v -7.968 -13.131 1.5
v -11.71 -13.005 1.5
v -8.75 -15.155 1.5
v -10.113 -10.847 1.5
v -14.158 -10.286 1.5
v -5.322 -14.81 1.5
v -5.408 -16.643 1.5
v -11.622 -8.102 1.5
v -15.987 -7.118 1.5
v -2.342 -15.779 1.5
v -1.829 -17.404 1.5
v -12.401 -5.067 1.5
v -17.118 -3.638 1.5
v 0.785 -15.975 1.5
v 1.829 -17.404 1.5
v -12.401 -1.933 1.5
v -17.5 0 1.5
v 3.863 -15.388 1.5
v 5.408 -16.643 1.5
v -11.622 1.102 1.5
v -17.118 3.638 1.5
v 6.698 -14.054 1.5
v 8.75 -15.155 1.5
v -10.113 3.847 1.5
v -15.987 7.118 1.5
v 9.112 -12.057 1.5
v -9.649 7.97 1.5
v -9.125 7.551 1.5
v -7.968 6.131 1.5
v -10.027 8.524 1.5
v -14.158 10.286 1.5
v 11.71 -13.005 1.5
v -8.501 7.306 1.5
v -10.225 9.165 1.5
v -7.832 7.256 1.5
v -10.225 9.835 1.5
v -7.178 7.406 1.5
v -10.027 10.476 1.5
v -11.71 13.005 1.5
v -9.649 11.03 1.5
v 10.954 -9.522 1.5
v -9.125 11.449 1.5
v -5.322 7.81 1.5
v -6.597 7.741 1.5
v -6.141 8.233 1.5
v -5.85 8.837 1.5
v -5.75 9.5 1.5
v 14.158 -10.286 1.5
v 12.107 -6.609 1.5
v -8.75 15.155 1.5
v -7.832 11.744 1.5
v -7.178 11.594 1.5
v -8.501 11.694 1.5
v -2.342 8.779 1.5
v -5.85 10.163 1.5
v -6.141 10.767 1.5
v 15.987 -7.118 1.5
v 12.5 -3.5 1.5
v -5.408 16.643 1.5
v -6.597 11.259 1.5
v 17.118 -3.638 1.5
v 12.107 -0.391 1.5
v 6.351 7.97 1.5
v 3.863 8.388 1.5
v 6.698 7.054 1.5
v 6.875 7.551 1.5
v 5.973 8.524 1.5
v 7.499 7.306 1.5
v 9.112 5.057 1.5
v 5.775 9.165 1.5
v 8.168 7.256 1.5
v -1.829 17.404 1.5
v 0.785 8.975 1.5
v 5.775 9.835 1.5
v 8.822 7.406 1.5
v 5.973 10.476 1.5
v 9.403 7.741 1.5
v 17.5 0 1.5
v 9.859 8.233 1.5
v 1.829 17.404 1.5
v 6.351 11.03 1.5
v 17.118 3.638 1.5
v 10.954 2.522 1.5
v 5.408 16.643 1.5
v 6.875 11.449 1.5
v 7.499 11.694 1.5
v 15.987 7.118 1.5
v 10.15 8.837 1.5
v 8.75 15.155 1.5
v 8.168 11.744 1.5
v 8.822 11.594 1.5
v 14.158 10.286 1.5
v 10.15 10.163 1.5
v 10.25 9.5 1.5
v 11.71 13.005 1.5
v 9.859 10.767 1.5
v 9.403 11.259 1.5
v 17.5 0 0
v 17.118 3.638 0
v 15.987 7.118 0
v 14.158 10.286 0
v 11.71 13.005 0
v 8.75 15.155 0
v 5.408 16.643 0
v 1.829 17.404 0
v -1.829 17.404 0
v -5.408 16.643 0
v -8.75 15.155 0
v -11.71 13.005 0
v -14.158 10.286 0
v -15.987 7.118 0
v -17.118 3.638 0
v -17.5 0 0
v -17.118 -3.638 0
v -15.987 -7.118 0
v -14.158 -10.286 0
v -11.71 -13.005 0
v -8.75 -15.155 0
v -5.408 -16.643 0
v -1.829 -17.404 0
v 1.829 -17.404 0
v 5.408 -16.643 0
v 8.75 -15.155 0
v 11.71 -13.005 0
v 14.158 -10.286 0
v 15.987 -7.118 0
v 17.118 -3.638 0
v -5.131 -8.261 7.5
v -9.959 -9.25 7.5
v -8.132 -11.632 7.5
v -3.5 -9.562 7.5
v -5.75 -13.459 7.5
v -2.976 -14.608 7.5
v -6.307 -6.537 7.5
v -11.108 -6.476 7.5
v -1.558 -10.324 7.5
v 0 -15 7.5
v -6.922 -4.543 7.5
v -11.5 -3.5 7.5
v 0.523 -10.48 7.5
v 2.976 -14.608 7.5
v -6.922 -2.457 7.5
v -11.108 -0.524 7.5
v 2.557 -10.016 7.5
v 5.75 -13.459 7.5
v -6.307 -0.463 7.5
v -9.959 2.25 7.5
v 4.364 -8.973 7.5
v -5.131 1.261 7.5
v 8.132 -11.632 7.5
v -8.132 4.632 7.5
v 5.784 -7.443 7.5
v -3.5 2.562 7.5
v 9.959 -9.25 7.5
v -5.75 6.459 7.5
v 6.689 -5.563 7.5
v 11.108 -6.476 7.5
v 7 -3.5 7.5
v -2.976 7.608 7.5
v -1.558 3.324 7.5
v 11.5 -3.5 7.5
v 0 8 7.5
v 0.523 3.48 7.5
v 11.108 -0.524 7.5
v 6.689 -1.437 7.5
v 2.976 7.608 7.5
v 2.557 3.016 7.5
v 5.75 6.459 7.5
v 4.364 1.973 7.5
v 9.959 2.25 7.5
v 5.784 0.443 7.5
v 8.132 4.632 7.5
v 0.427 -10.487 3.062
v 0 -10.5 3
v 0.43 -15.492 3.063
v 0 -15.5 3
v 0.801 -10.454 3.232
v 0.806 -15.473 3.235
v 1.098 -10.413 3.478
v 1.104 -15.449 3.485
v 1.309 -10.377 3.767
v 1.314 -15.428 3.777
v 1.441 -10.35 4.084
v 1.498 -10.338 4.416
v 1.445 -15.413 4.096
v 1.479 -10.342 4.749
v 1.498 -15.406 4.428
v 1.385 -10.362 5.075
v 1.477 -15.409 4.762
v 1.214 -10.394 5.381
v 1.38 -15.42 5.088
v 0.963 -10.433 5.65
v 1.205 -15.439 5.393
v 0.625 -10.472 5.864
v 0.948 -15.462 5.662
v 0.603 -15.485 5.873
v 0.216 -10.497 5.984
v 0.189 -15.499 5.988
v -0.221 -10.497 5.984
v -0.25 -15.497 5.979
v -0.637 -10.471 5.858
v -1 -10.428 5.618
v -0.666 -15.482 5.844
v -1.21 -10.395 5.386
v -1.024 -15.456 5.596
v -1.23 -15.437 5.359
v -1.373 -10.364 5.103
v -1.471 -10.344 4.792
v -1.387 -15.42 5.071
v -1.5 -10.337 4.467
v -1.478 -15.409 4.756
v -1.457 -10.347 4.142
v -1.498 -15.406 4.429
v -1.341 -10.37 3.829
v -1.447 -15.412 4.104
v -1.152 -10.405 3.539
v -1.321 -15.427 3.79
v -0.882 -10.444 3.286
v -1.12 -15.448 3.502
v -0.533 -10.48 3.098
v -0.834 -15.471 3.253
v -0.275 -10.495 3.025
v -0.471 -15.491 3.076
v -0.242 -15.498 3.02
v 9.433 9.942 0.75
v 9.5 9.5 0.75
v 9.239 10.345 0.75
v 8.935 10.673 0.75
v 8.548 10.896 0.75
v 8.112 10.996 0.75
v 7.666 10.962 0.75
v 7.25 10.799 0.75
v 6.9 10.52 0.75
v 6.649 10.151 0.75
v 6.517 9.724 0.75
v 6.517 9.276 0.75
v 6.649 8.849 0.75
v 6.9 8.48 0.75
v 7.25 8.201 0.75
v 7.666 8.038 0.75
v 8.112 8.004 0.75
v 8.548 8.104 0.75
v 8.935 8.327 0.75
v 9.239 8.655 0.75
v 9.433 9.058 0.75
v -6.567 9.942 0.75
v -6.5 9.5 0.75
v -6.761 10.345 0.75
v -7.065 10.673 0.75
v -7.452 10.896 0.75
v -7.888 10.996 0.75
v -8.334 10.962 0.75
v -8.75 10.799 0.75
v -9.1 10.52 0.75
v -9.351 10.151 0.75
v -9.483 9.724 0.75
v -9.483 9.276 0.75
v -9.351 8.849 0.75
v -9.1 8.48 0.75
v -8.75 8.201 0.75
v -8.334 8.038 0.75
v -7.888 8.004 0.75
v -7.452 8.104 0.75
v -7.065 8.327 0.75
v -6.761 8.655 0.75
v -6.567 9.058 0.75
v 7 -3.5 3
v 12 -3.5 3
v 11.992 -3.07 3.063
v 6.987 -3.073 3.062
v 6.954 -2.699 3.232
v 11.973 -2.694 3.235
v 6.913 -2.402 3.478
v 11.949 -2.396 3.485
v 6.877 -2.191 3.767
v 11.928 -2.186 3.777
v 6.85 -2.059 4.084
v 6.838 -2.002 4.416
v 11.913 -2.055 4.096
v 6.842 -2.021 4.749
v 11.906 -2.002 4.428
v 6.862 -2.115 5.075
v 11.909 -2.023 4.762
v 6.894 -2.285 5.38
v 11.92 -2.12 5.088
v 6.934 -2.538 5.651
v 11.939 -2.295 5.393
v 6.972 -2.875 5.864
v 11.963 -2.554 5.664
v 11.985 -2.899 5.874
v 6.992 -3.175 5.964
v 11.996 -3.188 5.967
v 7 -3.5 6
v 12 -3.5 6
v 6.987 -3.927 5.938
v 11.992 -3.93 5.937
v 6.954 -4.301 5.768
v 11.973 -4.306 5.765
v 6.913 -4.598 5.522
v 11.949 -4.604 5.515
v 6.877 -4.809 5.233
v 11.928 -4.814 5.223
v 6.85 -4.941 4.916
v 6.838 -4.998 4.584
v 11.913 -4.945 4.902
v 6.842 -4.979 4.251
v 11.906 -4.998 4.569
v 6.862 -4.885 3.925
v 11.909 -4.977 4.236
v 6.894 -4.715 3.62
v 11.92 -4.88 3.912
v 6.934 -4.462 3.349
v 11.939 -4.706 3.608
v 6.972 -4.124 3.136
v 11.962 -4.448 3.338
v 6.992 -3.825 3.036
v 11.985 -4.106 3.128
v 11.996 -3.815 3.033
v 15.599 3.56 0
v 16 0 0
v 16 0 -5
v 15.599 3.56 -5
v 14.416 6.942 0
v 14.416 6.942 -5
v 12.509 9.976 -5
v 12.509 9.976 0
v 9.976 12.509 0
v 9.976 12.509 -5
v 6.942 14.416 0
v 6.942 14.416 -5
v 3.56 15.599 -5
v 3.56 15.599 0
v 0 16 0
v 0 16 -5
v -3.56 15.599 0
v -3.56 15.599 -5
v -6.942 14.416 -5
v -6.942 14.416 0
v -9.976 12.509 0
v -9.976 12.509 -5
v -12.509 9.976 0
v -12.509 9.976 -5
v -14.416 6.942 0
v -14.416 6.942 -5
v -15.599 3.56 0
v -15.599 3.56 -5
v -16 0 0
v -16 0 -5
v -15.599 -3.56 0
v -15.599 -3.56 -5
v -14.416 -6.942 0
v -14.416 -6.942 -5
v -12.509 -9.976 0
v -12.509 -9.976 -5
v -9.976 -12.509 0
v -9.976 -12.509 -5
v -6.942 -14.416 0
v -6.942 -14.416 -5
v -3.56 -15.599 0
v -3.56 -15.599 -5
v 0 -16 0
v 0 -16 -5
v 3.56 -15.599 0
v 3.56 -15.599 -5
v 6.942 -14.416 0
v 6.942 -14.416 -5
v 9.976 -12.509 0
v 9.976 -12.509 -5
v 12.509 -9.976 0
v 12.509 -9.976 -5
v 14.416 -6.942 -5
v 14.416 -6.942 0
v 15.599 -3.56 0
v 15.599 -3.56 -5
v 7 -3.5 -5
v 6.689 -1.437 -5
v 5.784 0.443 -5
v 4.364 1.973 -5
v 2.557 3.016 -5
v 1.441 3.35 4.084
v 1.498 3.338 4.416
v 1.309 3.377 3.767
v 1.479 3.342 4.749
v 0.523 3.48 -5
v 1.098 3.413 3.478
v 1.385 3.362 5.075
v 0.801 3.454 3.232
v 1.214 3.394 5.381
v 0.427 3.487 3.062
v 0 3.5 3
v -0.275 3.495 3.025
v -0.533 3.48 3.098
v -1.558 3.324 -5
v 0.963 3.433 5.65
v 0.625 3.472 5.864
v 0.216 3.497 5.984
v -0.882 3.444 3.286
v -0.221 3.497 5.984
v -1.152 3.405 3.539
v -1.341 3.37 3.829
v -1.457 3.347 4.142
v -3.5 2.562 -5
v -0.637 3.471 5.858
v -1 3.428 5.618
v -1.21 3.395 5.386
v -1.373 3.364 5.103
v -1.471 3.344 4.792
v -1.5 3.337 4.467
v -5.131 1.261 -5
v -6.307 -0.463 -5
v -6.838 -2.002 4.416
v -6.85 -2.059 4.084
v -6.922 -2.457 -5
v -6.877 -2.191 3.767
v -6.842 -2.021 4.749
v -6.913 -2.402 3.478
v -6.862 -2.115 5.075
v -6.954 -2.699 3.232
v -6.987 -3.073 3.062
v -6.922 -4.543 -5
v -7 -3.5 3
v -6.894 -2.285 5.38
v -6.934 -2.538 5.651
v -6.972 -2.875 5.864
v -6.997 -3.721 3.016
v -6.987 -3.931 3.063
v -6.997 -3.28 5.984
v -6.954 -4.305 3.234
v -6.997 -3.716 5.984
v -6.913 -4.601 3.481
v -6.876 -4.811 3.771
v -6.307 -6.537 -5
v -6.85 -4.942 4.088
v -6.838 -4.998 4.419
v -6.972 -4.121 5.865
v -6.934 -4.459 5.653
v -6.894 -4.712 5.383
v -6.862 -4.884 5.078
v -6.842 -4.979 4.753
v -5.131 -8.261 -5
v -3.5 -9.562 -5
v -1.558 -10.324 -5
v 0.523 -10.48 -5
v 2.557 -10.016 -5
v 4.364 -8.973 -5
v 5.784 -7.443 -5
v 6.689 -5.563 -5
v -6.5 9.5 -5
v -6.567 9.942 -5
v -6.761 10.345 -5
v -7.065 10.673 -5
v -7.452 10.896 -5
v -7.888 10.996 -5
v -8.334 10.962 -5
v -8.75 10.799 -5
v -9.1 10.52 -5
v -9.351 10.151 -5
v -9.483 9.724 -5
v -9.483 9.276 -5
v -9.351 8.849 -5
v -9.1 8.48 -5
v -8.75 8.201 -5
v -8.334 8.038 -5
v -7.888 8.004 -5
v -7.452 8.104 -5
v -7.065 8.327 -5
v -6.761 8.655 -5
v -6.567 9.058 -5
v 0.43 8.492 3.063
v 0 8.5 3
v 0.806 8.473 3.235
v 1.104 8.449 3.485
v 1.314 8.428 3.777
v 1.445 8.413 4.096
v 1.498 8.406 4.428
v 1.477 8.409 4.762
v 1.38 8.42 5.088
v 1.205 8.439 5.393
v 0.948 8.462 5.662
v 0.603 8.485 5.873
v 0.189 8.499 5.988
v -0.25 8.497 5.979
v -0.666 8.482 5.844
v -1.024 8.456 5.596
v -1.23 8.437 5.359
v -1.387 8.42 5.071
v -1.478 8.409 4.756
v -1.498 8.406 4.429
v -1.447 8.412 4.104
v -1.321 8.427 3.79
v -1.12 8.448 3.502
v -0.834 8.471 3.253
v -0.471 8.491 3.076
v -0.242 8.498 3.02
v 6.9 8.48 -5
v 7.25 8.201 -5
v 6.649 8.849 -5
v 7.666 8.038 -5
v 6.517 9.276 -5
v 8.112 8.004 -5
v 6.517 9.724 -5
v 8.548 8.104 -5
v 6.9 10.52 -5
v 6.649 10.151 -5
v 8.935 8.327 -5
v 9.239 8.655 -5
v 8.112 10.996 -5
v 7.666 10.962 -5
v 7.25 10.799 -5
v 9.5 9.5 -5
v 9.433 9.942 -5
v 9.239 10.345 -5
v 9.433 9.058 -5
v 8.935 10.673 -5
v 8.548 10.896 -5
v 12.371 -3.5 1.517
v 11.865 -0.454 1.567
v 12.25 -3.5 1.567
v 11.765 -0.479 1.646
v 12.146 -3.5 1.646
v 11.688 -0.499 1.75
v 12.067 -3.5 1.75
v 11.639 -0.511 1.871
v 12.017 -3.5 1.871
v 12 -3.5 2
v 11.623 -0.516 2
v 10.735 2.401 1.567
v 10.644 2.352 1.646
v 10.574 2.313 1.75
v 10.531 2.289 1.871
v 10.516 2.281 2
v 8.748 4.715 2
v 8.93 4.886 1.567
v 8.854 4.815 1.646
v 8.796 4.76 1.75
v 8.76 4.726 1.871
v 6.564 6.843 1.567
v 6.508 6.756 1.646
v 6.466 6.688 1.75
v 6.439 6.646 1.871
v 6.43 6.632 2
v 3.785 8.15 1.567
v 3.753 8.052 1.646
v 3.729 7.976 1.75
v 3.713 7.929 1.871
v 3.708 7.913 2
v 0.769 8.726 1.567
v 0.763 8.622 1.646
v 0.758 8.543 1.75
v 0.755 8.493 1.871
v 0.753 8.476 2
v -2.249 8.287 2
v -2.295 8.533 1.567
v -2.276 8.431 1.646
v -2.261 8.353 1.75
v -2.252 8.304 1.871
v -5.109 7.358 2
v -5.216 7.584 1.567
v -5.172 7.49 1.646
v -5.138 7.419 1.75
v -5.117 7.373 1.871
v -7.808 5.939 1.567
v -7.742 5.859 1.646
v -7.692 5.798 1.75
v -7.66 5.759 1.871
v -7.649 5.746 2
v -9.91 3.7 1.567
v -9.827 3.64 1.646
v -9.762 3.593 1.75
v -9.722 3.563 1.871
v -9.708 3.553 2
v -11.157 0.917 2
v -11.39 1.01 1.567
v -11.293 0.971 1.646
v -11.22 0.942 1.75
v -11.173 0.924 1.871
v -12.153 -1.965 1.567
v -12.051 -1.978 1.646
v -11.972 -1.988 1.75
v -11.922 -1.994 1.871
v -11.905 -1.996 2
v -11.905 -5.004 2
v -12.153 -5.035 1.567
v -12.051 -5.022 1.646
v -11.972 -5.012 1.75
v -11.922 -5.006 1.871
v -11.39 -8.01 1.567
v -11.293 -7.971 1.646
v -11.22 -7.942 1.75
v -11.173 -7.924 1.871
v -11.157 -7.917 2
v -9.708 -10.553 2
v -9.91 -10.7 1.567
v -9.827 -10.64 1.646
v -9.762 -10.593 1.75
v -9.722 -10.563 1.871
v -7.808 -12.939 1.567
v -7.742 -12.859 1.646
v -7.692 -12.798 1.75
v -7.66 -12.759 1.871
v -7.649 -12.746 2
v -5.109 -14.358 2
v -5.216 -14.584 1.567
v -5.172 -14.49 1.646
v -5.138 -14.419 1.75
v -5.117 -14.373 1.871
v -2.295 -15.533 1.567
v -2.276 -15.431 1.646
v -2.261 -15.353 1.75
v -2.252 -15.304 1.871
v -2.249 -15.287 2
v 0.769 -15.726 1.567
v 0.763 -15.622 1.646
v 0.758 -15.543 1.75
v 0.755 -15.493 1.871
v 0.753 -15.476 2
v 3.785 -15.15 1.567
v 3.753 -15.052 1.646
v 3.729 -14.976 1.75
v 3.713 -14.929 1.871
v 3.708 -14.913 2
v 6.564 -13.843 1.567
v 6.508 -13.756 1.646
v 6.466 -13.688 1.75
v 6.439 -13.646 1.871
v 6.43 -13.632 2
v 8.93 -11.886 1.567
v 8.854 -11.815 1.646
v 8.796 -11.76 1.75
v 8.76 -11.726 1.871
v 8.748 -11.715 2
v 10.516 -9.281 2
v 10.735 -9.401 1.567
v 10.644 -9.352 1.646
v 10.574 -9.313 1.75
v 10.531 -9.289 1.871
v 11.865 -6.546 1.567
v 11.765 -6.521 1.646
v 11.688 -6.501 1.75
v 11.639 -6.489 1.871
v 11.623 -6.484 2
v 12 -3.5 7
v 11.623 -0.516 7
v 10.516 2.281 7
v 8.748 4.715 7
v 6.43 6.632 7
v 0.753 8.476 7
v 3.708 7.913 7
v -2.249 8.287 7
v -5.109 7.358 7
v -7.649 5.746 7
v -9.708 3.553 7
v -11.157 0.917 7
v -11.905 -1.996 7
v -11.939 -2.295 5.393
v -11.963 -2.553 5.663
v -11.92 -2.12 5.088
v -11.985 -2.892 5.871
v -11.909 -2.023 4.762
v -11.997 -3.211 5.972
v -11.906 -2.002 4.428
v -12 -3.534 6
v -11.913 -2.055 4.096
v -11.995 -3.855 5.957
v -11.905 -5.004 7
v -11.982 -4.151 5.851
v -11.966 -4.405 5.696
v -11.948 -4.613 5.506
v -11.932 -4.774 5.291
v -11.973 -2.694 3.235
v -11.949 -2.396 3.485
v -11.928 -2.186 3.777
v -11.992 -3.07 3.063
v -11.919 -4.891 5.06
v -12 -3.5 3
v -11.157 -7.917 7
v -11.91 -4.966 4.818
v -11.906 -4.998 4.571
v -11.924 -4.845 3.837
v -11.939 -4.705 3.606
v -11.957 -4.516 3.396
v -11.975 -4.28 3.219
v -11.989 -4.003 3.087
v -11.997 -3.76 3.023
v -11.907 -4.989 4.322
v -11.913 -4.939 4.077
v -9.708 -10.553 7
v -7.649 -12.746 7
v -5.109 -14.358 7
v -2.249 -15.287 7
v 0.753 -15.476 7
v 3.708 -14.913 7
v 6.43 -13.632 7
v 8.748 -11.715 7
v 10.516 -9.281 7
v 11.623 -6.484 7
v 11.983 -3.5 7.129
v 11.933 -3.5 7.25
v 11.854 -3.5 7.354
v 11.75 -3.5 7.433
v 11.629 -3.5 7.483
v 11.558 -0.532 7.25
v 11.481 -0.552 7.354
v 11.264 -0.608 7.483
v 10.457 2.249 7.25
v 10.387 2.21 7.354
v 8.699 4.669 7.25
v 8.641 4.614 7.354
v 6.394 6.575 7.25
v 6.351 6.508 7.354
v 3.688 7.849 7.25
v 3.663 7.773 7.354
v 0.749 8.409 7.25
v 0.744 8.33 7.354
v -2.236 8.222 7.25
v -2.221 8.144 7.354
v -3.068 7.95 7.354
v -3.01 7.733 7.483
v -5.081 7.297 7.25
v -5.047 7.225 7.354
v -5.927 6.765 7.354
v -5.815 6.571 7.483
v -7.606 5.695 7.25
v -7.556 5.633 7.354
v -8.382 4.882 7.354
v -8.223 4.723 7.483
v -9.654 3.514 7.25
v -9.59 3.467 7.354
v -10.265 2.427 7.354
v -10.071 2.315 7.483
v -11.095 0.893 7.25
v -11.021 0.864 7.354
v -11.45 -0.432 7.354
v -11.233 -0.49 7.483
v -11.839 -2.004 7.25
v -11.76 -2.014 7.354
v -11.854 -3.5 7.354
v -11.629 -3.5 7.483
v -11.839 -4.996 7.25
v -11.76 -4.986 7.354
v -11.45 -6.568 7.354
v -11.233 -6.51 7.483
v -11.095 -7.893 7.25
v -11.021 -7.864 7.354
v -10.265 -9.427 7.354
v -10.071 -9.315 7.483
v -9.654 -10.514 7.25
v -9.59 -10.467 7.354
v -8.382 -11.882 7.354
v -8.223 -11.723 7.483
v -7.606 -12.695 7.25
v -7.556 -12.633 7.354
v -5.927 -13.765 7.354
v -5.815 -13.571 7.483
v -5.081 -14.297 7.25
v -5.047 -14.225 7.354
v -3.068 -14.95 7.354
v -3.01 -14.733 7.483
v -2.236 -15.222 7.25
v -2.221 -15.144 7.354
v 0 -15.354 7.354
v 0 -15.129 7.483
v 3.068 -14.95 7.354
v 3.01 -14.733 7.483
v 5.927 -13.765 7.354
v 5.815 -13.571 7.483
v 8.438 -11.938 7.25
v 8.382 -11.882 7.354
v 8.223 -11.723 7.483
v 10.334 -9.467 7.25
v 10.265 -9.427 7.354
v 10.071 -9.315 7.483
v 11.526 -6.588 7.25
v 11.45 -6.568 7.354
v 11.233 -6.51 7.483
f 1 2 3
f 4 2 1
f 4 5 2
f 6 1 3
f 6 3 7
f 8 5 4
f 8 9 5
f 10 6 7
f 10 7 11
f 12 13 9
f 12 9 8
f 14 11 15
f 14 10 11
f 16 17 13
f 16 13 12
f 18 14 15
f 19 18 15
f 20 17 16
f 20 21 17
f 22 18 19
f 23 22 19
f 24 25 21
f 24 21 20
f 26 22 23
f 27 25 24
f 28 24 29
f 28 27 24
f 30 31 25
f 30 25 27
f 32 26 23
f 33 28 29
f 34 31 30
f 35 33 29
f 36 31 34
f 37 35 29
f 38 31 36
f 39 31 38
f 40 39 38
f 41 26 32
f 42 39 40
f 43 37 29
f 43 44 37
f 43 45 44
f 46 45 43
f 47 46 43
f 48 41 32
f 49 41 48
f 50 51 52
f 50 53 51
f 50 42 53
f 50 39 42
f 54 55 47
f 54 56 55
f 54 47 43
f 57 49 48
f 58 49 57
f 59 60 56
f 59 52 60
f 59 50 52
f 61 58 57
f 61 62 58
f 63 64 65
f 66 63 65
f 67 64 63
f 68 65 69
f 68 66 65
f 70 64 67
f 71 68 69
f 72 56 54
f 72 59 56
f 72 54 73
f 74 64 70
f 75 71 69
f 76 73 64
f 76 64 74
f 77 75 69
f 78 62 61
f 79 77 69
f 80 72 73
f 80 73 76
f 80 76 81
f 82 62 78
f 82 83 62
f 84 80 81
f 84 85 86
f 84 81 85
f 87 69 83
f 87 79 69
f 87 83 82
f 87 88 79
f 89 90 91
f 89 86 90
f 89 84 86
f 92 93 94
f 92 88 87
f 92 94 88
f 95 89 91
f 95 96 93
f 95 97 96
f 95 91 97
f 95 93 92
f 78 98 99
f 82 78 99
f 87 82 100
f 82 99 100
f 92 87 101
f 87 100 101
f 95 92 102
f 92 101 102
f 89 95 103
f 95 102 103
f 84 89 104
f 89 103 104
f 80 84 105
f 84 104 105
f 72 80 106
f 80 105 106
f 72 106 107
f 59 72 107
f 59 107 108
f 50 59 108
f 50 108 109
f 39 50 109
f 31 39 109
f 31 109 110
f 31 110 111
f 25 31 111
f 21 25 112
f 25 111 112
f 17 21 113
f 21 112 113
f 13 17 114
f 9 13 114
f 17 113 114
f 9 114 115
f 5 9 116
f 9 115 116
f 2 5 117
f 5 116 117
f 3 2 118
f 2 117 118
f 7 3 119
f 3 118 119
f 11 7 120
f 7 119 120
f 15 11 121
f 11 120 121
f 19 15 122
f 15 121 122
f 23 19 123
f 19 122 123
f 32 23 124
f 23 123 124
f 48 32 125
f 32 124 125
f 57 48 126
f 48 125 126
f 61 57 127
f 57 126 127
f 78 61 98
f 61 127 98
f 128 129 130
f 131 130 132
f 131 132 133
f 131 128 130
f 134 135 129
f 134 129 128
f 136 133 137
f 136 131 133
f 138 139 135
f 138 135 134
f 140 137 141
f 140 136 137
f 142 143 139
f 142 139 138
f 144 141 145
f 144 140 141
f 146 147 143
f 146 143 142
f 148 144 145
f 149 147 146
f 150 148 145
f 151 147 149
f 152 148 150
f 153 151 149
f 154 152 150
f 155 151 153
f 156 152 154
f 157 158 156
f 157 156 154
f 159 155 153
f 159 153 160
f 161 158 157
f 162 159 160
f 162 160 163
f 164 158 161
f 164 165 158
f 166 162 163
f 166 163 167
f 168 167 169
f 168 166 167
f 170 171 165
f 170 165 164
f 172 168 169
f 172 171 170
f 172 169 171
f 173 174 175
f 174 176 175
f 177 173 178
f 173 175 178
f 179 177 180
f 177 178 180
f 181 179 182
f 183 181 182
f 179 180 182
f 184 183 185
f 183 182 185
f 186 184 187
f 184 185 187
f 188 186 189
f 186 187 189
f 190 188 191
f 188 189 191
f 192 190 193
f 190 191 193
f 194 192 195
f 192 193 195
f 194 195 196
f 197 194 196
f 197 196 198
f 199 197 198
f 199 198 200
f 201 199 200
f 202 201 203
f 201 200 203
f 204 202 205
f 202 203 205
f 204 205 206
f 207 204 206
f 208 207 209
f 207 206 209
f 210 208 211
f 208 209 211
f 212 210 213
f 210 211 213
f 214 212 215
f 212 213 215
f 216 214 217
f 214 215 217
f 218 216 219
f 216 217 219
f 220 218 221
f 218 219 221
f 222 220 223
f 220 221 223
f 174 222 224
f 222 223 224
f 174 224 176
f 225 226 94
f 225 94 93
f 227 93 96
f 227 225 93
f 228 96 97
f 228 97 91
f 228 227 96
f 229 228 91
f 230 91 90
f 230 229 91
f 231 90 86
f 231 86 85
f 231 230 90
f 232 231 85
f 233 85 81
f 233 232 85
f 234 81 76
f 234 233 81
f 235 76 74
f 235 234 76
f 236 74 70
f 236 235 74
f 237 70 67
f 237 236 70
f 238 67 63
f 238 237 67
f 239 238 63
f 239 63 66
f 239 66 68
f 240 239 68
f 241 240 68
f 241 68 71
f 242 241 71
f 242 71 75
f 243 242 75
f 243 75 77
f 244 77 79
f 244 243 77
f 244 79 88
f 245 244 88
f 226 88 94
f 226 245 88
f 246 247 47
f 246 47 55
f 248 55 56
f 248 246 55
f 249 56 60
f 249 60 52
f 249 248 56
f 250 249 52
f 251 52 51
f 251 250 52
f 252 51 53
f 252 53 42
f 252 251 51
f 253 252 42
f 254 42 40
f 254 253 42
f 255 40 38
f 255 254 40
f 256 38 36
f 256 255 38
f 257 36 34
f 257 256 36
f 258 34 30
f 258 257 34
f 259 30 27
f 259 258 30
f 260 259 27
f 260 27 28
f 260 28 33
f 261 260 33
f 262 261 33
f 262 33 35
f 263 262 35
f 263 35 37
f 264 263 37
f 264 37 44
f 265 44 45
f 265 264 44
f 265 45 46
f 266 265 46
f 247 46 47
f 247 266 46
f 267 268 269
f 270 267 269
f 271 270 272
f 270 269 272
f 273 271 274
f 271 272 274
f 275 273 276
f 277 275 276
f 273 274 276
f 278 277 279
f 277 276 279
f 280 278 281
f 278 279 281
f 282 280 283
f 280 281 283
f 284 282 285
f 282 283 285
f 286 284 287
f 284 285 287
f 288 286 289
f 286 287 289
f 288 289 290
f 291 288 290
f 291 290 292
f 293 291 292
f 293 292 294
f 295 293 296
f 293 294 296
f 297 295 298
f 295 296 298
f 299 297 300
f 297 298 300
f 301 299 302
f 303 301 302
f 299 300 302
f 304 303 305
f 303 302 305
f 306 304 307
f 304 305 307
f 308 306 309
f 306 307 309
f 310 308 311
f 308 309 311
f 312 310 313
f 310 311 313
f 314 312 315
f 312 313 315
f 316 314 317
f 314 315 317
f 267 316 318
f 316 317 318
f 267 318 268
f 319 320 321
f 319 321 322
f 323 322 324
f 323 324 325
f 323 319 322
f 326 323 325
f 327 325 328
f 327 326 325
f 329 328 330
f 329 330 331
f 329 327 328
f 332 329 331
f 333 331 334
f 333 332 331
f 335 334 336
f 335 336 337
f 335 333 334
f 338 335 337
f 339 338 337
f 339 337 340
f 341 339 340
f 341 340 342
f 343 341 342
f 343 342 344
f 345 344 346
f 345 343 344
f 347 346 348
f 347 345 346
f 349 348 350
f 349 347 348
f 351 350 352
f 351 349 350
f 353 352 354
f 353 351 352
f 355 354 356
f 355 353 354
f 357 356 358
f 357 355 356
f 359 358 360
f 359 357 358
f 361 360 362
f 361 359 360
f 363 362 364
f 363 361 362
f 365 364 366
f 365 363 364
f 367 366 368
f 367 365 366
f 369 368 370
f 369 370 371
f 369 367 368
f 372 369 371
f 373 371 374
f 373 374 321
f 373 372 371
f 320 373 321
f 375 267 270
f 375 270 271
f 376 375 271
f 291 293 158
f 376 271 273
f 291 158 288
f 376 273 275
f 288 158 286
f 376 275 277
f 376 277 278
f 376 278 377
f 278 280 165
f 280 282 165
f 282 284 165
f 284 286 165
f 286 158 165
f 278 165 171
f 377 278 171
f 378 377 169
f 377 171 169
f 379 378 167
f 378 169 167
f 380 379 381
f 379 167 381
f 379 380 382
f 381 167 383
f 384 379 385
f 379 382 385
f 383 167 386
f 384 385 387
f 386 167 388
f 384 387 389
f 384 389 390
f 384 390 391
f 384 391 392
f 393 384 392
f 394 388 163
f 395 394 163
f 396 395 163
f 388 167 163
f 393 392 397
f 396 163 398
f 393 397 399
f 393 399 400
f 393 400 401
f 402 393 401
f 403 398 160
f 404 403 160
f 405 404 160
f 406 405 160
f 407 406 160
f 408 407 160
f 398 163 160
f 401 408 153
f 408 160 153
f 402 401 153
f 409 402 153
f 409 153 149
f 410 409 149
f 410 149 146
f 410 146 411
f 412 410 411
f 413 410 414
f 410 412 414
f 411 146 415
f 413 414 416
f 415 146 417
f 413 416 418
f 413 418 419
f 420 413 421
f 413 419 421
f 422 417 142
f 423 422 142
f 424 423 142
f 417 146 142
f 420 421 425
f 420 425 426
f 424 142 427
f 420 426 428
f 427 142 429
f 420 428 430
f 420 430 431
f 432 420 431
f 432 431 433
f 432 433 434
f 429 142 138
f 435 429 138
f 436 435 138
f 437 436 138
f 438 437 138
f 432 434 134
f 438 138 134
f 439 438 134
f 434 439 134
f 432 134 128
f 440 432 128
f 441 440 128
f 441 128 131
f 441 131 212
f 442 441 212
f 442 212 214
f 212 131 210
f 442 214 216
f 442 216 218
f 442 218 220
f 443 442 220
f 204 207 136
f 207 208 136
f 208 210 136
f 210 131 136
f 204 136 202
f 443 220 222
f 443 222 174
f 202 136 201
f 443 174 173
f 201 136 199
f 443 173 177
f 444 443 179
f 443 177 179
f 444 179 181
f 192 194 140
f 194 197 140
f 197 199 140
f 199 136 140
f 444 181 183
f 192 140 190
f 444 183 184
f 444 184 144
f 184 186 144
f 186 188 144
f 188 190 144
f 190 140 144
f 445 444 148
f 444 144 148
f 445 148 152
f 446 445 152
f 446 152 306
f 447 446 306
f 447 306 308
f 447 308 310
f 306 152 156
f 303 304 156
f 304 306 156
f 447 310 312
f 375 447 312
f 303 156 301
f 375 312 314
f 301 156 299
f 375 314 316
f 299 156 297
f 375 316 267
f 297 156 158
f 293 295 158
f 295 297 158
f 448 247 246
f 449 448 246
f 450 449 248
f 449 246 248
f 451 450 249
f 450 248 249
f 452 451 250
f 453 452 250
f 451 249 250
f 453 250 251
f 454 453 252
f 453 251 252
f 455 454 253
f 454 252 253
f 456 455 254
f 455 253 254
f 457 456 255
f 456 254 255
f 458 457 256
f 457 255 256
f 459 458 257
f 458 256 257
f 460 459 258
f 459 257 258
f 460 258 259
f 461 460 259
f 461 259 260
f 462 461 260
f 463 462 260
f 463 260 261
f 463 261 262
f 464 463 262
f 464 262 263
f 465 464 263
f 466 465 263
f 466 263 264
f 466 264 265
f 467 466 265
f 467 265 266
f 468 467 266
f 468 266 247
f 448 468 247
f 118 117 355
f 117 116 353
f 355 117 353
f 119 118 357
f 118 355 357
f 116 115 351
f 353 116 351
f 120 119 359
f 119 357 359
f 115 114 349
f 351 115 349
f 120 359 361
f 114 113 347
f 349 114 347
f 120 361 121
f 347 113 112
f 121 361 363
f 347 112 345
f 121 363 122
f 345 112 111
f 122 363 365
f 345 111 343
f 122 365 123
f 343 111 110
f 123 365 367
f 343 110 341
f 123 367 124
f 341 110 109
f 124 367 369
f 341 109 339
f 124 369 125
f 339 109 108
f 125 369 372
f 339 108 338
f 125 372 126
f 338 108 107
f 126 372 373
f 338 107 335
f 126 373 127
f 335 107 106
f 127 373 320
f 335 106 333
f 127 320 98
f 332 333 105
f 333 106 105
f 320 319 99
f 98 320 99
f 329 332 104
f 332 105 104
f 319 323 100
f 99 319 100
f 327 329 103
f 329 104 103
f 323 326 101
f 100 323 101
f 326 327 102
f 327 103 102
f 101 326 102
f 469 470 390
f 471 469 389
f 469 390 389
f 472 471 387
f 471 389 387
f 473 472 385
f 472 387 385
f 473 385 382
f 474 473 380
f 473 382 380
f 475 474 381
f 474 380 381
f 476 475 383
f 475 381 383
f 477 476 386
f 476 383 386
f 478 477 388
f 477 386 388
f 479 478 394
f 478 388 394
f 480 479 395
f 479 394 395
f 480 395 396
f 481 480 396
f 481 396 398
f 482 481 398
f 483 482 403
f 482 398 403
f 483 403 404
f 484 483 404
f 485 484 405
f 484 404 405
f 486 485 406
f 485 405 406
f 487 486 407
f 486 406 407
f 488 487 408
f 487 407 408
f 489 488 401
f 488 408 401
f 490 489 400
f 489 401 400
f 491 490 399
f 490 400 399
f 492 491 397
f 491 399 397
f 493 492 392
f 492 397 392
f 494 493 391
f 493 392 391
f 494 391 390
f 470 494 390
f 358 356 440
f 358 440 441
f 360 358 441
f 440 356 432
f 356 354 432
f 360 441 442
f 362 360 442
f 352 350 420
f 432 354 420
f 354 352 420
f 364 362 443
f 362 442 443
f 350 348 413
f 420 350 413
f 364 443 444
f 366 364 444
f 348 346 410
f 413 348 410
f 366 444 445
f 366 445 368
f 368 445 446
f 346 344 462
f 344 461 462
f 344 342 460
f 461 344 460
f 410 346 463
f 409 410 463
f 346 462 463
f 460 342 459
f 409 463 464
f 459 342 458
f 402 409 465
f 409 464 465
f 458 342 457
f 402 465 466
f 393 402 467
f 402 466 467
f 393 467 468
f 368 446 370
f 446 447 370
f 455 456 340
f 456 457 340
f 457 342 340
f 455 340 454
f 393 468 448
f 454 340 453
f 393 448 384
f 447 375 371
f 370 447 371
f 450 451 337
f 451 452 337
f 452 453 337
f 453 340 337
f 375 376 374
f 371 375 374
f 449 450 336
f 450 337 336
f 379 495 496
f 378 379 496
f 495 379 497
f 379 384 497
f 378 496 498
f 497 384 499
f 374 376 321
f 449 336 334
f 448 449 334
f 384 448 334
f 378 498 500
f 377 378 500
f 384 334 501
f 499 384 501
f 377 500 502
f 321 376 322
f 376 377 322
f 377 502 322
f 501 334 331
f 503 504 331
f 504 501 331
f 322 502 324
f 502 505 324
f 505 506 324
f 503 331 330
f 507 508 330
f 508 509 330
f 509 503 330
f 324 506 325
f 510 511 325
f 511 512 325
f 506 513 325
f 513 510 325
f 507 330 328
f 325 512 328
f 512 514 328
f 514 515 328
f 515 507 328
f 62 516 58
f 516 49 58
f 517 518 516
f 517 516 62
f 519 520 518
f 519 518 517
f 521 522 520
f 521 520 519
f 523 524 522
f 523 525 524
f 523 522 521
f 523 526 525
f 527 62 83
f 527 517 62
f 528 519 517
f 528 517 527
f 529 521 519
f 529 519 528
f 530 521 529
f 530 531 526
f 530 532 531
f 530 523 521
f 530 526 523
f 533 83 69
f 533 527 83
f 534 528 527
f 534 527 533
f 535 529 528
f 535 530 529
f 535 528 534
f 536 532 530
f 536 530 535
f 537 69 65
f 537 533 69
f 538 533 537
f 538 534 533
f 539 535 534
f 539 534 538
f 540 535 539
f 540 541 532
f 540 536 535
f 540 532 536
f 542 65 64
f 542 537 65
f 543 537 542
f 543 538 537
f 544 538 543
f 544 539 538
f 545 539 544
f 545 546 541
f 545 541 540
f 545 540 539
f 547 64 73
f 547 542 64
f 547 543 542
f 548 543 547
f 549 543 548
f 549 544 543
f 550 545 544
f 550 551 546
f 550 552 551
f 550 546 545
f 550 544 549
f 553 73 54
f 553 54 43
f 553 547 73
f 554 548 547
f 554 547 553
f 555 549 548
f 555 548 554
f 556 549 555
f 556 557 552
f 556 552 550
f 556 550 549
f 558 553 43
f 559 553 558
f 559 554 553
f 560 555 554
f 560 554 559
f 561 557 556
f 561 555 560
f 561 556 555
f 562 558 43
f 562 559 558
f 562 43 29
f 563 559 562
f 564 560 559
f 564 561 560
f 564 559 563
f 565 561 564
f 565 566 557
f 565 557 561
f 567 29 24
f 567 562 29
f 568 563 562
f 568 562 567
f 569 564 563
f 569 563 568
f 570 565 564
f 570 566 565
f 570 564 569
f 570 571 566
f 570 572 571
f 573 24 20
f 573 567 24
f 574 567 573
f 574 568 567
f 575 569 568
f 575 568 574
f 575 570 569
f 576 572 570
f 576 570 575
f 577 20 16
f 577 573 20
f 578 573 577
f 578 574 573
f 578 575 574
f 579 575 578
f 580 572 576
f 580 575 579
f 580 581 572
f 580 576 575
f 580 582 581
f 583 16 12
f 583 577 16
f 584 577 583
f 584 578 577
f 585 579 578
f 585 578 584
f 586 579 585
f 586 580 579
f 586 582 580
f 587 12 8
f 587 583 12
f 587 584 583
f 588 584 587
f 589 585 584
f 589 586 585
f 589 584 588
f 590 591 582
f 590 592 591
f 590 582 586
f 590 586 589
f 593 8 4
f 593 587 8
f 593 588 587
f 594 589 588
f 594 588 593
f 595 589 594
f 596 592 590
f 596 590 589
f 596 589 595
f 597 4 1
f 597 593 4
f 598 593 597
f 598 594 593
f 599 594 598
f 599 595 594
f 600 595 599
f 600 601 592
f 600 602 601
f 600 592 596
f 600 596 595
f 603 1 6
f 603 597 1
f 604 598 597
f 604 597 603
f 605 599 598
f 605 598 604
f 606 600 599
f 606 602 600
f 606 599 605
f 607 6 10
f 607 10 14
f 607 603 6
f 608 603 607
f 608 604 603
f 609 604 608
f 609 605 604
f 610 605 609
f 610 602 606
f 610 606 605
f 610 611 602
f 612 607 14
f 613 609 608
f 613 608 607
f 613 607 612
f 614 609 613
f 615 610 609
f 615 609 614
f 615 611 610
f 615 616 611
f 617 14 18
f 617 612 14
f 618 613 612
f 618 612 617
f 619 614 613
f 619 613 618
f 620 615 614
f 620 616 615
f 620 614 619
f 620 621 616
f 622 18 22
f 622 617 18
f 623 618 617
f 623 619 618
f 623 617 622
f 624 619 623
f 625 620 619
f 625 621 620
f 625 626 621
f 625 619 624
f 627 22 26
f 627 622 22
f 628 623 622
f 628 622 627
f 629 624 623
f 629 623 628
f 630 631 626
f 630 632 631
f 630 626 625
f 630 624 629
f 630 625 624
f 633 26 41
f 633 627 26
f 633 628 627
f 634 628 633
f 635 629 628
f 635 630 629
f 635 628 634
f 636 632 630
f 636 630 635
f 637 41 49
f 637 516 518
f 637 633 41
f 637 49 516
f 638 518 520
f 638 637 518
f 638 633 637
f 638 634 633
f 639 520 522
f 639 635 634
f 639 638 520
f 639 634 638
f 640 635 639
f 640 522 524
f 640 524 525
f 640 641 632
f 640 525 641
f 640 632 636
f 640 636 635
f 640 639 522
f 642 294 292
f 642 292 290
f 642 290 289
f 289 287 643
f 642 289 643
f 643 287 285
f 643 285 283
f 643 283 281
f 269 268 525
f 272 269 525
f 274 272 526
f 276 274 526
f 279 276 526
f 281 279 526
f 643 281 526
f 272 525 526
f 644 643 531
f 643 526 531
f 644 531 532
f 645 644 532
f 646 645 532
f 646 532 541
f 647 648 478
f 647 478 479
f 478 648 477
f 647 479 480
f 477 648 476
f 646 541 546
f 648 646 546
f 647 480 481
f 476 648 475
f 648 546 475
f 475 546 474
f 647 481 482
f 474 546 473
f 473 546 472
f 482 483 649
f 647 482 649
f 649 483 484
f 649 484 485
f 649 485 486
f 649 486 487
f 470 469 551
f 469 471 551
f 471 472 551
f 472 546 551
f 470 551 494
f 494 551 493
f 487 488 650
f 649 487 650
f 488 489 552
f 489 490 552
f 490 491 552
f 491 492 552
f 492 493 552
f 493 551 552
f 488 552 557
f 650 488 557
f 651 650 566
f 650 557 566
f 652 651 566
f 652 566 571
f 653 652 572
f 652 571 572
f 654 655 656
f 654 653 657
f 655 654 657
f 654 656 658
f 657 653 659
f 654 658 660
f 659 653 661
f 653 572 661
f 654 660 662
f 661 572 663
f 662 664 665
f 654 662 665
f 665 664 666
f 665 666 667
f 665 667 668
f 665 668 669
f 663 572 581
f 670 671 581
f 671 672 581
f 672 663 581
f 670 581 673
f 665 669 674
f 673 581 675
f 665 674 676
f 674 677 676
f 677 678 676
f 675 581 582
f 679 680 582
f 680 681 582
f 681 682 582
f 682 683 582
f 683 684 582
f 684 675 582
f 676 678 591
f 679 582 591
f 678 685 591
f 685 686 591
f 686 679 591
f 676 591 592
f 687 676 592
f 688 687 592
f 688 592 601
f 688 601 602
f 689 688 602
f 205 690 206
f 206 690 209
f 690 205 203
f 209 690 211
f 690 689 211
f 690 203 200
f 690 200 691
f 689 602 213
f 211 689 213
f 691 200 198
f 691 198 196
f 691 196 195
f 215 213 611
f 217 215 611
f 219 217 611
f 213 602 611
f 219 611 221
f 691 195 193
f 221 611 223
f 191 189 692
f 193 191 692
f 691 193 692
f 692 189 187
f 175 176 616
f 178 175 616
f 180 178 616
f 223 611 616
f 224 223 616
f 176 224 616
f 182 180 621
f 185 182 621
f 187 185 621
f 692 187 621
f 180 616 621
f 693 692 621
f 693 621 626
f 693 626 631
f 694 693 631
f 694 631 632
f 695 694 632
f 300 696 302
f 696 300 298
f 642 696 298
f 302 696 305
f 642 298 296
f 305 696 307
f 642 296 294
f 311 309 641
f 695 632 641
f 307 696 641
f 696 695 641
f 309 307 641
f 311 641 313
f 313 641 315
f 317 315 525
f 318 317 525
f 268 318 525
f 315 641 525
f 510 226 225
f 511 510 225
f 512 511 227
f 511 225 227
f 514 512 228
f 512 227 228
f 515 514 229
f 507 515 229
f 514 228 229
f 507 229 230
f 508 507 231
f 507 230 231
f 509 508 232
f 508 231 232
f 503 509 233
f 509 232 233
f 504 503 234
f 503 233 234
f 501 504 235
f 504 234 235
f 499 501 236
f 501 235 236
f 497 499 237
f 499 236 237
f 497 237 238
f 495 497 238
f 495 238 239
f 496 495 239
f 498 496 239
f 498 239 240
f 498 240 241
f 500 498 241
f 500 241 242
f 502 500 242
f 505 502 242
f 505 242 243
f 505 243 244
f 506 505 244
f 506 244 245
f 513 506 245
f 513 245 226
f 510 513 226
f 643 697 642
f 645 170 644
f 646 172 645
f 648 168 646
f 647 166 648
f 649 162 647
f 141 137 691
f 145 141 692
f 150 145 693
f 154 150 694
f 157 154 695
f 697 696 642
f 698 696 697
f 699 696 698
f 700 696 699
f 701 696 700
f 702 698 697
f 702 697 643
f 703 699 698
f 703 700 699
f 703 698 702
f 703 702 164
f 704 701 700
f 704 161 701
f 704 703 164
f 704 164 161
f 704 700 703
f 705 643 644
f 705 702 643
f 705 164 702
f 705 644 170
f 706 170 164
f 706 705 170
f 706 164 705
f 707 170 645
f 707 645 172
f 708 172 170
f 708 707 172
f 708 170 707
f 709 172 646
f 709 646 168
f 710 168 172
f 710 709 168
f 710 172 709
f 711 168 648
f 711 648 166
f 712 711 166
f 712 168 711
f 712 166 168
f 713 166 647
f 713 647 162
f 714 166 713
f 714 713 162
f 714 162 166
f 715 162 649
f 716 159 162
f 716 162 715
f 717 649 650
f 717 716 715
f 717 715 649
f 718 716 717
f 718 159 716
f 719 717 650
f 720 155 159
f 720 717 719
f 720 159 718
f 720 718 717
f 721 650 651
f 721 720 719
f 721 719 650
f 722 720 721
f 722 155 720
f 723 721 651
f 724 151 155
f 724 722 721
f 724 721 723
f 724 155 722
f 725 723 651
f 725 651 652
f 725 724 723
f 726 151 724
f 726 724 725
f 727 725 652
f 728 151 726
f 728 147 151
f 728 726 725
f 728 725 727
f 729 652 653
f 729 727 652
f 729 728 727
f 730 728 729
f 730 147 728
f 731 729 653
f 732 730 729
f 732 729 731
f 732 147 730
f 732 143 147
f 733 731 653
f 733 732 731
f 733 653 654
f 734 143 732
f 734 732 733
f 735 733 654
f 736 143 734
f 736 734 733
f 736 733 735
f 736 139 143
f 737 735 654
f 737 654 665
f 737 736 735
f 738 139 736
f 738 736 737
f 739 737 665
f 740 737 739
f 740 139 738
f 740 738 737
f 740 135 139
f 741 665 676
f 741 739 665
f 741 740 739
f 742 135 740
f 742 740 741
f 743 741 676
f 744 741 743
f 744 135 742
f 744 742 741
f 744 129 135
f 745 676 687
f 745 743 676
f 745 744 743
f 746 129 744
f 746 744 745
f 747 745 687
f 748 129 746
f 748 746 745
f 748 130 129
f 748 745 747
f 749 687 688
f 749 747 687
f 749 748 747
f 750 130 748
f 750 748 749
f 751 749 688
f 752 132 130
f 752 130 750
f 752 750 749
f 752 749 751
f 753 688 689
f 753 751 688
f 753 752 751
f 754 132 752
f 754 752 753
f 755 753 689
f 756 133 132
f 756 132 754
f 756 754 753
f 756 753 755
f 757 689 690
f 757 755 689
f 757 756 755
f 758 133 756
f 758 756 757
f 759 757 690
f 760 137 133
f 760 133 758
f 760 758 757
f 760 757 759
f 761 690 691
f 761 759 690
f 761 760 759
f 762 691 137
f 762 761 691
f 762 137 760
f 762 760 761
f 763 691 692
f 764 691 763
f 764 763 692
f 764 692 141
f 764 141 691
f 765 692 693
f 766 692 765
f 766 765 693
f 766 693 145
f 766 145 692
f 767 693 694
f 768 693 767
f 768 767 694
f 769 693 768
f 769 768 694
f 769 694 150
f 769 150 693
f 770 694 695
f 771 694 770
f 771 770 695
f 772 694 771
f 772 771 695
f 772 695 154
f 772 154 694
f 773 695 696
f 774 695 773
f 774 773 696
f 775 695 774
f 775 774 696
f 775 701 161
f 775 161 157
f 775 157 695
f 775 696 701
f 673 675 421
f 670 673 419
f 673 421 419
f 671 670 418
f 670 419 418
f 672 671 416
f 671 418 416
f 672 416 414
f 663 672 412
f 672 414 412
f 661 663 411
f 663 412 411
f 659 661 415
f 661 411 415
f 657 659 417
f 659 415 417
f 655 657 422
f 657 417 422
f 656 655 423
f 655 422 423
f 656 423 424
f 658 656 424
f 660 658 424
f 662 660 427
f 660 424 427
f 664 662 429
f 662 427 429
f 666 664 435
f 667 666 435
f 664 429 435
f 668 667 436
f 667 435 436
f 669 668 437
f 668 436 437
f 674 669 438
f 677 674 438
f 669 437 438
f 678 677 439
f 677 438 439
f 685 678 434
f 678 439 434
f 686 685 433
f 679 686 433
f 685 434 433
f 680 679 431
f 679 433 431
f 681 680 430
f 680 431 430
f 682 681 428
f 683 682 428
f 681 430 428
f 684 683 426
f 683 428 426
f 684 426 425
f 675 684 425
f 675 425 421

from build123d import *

# Parameters (mm, degrees)
SKETCH1_R           = 17.5
BOSS_EXTRUDE1_DEPTH = 1.5
BOSS_EXTRUDE2_START = -1.5
SKETCH2_R           = 16
BOSS_EXTRUDE2_DEPTH = 5
SKETCH3_R           = 12
BOSS_EXTRUDE3_DEPTH = 6
SKETCH4_R           = 7
CUT_EXTRUDE1_DEPTH  = 28.726341266
SKETCH5_R           = 1.5
CUT_EXTRUDE2_DEPTH  = 26.588083164
CHAMFER1_SIZE       = 0.75
FILLET1_R           = 0.5
SKETCH6_R           = 1.5
CUT_EXTRUDE3_DEPTH  = 26.860201082
CIRPATTERN1_COUNT   = 4


with BuildPart() as part:
    # Sketch1 → Boss-Extrude1 (new body)
    with BuildSketch(Plane.XY):
        Circle(SKETCH1_R)
    extrude(amount=BOSS_EXTRUDE1_DEPTH)

    # Sketch2 → Boss-Extrude2 (add)
    with BuildSketch(Plane.XY.offset(1.5).offset(BOSS_EXTRUDE2_START)):
        Circle(SKETCH2_R)
    extrude(amount=-BOSS_EXTRUDE2_DEPTH)

    # Sketch3 → Boss-Extrude3 (add)
    with BuildSketch(Plane.XY.offset(1.5)):
        with Locations((0, -3.5)):
            Circle(SKETCH3_R)
    extrude(amount=BOSS_EXTRUDE3_DEPTH)

    # Sketch4 → Cut-Extrude1 (cut, through all)
    with BuildSketch(Plane.XY.offset(7.5)):
        with Locations((0, -3.5)):
            Circle(SKETCH4_R)
    extrude(amount=-CUT_EXTRUDE1_DEPTH, mode=Mode.SUBTRACT)

    # Sketch5 → Cut-Extrude2 (cut, through all)
    with BuildSketch(Plane.XY.offset(1.5)):
        with Locations((-8, 9.5)):
            Circle(SKETCH5_R)
        with Locations((8, 9.5)):
            Circle(SKETCH5_R)
    extrude(amount=-CUT_EXTRUDE2_DEPTH, mode=Mode.SUBTRACT)

    # Chamfer1
    chamfer1_edges = [part.edges().sort_by_distance(p)[0] for p in [
        (-9.5, 9.5, 1.5),
        (6.5, 9.5, 1.5),
    ]]
    chamfer(chamfer1_edges, length=CHAMFER1_SIZE)

    # Fillet1
    fillet1_edges = [part.edges().sort_by_distance(p)[0] for p in [
        (-12, -3.5, 1.5),
        (-12, -3.5, 7.5),
    ]]
    fillet(fillet1_edges, radius=FILLET1_R)

    # Sketch6 → Cut-Extrude3 (cut, symmetric)
    with BuildSketch(Plane(origin=(0, 0, 0), x_dir=(0, 0, -1), z_dir=(1, 0, 0))):
        with Locations((-4.5, -3.5)):
            Circle(SKETCH6_R)
    cut_extrude3 = extrude(amount=CUT_EXTRUDE3_DEPTH, both=True, mode=Mode.SUBTRACT)

    # CirPattern1: Cut-Extrude3 ×4 about axis
    cirpattern1_axis = Axis((0, -3.5, 7.5), (0, 0, -1))
    for i in range(1, CIRPATTERN1_COUNT):
        add(cut_extrude3.rotate(cirpattern1_axis, i * 360 / CIRPATTERN1_COUNT), mode=Mode.SUBTRACT)


solid = part.part
